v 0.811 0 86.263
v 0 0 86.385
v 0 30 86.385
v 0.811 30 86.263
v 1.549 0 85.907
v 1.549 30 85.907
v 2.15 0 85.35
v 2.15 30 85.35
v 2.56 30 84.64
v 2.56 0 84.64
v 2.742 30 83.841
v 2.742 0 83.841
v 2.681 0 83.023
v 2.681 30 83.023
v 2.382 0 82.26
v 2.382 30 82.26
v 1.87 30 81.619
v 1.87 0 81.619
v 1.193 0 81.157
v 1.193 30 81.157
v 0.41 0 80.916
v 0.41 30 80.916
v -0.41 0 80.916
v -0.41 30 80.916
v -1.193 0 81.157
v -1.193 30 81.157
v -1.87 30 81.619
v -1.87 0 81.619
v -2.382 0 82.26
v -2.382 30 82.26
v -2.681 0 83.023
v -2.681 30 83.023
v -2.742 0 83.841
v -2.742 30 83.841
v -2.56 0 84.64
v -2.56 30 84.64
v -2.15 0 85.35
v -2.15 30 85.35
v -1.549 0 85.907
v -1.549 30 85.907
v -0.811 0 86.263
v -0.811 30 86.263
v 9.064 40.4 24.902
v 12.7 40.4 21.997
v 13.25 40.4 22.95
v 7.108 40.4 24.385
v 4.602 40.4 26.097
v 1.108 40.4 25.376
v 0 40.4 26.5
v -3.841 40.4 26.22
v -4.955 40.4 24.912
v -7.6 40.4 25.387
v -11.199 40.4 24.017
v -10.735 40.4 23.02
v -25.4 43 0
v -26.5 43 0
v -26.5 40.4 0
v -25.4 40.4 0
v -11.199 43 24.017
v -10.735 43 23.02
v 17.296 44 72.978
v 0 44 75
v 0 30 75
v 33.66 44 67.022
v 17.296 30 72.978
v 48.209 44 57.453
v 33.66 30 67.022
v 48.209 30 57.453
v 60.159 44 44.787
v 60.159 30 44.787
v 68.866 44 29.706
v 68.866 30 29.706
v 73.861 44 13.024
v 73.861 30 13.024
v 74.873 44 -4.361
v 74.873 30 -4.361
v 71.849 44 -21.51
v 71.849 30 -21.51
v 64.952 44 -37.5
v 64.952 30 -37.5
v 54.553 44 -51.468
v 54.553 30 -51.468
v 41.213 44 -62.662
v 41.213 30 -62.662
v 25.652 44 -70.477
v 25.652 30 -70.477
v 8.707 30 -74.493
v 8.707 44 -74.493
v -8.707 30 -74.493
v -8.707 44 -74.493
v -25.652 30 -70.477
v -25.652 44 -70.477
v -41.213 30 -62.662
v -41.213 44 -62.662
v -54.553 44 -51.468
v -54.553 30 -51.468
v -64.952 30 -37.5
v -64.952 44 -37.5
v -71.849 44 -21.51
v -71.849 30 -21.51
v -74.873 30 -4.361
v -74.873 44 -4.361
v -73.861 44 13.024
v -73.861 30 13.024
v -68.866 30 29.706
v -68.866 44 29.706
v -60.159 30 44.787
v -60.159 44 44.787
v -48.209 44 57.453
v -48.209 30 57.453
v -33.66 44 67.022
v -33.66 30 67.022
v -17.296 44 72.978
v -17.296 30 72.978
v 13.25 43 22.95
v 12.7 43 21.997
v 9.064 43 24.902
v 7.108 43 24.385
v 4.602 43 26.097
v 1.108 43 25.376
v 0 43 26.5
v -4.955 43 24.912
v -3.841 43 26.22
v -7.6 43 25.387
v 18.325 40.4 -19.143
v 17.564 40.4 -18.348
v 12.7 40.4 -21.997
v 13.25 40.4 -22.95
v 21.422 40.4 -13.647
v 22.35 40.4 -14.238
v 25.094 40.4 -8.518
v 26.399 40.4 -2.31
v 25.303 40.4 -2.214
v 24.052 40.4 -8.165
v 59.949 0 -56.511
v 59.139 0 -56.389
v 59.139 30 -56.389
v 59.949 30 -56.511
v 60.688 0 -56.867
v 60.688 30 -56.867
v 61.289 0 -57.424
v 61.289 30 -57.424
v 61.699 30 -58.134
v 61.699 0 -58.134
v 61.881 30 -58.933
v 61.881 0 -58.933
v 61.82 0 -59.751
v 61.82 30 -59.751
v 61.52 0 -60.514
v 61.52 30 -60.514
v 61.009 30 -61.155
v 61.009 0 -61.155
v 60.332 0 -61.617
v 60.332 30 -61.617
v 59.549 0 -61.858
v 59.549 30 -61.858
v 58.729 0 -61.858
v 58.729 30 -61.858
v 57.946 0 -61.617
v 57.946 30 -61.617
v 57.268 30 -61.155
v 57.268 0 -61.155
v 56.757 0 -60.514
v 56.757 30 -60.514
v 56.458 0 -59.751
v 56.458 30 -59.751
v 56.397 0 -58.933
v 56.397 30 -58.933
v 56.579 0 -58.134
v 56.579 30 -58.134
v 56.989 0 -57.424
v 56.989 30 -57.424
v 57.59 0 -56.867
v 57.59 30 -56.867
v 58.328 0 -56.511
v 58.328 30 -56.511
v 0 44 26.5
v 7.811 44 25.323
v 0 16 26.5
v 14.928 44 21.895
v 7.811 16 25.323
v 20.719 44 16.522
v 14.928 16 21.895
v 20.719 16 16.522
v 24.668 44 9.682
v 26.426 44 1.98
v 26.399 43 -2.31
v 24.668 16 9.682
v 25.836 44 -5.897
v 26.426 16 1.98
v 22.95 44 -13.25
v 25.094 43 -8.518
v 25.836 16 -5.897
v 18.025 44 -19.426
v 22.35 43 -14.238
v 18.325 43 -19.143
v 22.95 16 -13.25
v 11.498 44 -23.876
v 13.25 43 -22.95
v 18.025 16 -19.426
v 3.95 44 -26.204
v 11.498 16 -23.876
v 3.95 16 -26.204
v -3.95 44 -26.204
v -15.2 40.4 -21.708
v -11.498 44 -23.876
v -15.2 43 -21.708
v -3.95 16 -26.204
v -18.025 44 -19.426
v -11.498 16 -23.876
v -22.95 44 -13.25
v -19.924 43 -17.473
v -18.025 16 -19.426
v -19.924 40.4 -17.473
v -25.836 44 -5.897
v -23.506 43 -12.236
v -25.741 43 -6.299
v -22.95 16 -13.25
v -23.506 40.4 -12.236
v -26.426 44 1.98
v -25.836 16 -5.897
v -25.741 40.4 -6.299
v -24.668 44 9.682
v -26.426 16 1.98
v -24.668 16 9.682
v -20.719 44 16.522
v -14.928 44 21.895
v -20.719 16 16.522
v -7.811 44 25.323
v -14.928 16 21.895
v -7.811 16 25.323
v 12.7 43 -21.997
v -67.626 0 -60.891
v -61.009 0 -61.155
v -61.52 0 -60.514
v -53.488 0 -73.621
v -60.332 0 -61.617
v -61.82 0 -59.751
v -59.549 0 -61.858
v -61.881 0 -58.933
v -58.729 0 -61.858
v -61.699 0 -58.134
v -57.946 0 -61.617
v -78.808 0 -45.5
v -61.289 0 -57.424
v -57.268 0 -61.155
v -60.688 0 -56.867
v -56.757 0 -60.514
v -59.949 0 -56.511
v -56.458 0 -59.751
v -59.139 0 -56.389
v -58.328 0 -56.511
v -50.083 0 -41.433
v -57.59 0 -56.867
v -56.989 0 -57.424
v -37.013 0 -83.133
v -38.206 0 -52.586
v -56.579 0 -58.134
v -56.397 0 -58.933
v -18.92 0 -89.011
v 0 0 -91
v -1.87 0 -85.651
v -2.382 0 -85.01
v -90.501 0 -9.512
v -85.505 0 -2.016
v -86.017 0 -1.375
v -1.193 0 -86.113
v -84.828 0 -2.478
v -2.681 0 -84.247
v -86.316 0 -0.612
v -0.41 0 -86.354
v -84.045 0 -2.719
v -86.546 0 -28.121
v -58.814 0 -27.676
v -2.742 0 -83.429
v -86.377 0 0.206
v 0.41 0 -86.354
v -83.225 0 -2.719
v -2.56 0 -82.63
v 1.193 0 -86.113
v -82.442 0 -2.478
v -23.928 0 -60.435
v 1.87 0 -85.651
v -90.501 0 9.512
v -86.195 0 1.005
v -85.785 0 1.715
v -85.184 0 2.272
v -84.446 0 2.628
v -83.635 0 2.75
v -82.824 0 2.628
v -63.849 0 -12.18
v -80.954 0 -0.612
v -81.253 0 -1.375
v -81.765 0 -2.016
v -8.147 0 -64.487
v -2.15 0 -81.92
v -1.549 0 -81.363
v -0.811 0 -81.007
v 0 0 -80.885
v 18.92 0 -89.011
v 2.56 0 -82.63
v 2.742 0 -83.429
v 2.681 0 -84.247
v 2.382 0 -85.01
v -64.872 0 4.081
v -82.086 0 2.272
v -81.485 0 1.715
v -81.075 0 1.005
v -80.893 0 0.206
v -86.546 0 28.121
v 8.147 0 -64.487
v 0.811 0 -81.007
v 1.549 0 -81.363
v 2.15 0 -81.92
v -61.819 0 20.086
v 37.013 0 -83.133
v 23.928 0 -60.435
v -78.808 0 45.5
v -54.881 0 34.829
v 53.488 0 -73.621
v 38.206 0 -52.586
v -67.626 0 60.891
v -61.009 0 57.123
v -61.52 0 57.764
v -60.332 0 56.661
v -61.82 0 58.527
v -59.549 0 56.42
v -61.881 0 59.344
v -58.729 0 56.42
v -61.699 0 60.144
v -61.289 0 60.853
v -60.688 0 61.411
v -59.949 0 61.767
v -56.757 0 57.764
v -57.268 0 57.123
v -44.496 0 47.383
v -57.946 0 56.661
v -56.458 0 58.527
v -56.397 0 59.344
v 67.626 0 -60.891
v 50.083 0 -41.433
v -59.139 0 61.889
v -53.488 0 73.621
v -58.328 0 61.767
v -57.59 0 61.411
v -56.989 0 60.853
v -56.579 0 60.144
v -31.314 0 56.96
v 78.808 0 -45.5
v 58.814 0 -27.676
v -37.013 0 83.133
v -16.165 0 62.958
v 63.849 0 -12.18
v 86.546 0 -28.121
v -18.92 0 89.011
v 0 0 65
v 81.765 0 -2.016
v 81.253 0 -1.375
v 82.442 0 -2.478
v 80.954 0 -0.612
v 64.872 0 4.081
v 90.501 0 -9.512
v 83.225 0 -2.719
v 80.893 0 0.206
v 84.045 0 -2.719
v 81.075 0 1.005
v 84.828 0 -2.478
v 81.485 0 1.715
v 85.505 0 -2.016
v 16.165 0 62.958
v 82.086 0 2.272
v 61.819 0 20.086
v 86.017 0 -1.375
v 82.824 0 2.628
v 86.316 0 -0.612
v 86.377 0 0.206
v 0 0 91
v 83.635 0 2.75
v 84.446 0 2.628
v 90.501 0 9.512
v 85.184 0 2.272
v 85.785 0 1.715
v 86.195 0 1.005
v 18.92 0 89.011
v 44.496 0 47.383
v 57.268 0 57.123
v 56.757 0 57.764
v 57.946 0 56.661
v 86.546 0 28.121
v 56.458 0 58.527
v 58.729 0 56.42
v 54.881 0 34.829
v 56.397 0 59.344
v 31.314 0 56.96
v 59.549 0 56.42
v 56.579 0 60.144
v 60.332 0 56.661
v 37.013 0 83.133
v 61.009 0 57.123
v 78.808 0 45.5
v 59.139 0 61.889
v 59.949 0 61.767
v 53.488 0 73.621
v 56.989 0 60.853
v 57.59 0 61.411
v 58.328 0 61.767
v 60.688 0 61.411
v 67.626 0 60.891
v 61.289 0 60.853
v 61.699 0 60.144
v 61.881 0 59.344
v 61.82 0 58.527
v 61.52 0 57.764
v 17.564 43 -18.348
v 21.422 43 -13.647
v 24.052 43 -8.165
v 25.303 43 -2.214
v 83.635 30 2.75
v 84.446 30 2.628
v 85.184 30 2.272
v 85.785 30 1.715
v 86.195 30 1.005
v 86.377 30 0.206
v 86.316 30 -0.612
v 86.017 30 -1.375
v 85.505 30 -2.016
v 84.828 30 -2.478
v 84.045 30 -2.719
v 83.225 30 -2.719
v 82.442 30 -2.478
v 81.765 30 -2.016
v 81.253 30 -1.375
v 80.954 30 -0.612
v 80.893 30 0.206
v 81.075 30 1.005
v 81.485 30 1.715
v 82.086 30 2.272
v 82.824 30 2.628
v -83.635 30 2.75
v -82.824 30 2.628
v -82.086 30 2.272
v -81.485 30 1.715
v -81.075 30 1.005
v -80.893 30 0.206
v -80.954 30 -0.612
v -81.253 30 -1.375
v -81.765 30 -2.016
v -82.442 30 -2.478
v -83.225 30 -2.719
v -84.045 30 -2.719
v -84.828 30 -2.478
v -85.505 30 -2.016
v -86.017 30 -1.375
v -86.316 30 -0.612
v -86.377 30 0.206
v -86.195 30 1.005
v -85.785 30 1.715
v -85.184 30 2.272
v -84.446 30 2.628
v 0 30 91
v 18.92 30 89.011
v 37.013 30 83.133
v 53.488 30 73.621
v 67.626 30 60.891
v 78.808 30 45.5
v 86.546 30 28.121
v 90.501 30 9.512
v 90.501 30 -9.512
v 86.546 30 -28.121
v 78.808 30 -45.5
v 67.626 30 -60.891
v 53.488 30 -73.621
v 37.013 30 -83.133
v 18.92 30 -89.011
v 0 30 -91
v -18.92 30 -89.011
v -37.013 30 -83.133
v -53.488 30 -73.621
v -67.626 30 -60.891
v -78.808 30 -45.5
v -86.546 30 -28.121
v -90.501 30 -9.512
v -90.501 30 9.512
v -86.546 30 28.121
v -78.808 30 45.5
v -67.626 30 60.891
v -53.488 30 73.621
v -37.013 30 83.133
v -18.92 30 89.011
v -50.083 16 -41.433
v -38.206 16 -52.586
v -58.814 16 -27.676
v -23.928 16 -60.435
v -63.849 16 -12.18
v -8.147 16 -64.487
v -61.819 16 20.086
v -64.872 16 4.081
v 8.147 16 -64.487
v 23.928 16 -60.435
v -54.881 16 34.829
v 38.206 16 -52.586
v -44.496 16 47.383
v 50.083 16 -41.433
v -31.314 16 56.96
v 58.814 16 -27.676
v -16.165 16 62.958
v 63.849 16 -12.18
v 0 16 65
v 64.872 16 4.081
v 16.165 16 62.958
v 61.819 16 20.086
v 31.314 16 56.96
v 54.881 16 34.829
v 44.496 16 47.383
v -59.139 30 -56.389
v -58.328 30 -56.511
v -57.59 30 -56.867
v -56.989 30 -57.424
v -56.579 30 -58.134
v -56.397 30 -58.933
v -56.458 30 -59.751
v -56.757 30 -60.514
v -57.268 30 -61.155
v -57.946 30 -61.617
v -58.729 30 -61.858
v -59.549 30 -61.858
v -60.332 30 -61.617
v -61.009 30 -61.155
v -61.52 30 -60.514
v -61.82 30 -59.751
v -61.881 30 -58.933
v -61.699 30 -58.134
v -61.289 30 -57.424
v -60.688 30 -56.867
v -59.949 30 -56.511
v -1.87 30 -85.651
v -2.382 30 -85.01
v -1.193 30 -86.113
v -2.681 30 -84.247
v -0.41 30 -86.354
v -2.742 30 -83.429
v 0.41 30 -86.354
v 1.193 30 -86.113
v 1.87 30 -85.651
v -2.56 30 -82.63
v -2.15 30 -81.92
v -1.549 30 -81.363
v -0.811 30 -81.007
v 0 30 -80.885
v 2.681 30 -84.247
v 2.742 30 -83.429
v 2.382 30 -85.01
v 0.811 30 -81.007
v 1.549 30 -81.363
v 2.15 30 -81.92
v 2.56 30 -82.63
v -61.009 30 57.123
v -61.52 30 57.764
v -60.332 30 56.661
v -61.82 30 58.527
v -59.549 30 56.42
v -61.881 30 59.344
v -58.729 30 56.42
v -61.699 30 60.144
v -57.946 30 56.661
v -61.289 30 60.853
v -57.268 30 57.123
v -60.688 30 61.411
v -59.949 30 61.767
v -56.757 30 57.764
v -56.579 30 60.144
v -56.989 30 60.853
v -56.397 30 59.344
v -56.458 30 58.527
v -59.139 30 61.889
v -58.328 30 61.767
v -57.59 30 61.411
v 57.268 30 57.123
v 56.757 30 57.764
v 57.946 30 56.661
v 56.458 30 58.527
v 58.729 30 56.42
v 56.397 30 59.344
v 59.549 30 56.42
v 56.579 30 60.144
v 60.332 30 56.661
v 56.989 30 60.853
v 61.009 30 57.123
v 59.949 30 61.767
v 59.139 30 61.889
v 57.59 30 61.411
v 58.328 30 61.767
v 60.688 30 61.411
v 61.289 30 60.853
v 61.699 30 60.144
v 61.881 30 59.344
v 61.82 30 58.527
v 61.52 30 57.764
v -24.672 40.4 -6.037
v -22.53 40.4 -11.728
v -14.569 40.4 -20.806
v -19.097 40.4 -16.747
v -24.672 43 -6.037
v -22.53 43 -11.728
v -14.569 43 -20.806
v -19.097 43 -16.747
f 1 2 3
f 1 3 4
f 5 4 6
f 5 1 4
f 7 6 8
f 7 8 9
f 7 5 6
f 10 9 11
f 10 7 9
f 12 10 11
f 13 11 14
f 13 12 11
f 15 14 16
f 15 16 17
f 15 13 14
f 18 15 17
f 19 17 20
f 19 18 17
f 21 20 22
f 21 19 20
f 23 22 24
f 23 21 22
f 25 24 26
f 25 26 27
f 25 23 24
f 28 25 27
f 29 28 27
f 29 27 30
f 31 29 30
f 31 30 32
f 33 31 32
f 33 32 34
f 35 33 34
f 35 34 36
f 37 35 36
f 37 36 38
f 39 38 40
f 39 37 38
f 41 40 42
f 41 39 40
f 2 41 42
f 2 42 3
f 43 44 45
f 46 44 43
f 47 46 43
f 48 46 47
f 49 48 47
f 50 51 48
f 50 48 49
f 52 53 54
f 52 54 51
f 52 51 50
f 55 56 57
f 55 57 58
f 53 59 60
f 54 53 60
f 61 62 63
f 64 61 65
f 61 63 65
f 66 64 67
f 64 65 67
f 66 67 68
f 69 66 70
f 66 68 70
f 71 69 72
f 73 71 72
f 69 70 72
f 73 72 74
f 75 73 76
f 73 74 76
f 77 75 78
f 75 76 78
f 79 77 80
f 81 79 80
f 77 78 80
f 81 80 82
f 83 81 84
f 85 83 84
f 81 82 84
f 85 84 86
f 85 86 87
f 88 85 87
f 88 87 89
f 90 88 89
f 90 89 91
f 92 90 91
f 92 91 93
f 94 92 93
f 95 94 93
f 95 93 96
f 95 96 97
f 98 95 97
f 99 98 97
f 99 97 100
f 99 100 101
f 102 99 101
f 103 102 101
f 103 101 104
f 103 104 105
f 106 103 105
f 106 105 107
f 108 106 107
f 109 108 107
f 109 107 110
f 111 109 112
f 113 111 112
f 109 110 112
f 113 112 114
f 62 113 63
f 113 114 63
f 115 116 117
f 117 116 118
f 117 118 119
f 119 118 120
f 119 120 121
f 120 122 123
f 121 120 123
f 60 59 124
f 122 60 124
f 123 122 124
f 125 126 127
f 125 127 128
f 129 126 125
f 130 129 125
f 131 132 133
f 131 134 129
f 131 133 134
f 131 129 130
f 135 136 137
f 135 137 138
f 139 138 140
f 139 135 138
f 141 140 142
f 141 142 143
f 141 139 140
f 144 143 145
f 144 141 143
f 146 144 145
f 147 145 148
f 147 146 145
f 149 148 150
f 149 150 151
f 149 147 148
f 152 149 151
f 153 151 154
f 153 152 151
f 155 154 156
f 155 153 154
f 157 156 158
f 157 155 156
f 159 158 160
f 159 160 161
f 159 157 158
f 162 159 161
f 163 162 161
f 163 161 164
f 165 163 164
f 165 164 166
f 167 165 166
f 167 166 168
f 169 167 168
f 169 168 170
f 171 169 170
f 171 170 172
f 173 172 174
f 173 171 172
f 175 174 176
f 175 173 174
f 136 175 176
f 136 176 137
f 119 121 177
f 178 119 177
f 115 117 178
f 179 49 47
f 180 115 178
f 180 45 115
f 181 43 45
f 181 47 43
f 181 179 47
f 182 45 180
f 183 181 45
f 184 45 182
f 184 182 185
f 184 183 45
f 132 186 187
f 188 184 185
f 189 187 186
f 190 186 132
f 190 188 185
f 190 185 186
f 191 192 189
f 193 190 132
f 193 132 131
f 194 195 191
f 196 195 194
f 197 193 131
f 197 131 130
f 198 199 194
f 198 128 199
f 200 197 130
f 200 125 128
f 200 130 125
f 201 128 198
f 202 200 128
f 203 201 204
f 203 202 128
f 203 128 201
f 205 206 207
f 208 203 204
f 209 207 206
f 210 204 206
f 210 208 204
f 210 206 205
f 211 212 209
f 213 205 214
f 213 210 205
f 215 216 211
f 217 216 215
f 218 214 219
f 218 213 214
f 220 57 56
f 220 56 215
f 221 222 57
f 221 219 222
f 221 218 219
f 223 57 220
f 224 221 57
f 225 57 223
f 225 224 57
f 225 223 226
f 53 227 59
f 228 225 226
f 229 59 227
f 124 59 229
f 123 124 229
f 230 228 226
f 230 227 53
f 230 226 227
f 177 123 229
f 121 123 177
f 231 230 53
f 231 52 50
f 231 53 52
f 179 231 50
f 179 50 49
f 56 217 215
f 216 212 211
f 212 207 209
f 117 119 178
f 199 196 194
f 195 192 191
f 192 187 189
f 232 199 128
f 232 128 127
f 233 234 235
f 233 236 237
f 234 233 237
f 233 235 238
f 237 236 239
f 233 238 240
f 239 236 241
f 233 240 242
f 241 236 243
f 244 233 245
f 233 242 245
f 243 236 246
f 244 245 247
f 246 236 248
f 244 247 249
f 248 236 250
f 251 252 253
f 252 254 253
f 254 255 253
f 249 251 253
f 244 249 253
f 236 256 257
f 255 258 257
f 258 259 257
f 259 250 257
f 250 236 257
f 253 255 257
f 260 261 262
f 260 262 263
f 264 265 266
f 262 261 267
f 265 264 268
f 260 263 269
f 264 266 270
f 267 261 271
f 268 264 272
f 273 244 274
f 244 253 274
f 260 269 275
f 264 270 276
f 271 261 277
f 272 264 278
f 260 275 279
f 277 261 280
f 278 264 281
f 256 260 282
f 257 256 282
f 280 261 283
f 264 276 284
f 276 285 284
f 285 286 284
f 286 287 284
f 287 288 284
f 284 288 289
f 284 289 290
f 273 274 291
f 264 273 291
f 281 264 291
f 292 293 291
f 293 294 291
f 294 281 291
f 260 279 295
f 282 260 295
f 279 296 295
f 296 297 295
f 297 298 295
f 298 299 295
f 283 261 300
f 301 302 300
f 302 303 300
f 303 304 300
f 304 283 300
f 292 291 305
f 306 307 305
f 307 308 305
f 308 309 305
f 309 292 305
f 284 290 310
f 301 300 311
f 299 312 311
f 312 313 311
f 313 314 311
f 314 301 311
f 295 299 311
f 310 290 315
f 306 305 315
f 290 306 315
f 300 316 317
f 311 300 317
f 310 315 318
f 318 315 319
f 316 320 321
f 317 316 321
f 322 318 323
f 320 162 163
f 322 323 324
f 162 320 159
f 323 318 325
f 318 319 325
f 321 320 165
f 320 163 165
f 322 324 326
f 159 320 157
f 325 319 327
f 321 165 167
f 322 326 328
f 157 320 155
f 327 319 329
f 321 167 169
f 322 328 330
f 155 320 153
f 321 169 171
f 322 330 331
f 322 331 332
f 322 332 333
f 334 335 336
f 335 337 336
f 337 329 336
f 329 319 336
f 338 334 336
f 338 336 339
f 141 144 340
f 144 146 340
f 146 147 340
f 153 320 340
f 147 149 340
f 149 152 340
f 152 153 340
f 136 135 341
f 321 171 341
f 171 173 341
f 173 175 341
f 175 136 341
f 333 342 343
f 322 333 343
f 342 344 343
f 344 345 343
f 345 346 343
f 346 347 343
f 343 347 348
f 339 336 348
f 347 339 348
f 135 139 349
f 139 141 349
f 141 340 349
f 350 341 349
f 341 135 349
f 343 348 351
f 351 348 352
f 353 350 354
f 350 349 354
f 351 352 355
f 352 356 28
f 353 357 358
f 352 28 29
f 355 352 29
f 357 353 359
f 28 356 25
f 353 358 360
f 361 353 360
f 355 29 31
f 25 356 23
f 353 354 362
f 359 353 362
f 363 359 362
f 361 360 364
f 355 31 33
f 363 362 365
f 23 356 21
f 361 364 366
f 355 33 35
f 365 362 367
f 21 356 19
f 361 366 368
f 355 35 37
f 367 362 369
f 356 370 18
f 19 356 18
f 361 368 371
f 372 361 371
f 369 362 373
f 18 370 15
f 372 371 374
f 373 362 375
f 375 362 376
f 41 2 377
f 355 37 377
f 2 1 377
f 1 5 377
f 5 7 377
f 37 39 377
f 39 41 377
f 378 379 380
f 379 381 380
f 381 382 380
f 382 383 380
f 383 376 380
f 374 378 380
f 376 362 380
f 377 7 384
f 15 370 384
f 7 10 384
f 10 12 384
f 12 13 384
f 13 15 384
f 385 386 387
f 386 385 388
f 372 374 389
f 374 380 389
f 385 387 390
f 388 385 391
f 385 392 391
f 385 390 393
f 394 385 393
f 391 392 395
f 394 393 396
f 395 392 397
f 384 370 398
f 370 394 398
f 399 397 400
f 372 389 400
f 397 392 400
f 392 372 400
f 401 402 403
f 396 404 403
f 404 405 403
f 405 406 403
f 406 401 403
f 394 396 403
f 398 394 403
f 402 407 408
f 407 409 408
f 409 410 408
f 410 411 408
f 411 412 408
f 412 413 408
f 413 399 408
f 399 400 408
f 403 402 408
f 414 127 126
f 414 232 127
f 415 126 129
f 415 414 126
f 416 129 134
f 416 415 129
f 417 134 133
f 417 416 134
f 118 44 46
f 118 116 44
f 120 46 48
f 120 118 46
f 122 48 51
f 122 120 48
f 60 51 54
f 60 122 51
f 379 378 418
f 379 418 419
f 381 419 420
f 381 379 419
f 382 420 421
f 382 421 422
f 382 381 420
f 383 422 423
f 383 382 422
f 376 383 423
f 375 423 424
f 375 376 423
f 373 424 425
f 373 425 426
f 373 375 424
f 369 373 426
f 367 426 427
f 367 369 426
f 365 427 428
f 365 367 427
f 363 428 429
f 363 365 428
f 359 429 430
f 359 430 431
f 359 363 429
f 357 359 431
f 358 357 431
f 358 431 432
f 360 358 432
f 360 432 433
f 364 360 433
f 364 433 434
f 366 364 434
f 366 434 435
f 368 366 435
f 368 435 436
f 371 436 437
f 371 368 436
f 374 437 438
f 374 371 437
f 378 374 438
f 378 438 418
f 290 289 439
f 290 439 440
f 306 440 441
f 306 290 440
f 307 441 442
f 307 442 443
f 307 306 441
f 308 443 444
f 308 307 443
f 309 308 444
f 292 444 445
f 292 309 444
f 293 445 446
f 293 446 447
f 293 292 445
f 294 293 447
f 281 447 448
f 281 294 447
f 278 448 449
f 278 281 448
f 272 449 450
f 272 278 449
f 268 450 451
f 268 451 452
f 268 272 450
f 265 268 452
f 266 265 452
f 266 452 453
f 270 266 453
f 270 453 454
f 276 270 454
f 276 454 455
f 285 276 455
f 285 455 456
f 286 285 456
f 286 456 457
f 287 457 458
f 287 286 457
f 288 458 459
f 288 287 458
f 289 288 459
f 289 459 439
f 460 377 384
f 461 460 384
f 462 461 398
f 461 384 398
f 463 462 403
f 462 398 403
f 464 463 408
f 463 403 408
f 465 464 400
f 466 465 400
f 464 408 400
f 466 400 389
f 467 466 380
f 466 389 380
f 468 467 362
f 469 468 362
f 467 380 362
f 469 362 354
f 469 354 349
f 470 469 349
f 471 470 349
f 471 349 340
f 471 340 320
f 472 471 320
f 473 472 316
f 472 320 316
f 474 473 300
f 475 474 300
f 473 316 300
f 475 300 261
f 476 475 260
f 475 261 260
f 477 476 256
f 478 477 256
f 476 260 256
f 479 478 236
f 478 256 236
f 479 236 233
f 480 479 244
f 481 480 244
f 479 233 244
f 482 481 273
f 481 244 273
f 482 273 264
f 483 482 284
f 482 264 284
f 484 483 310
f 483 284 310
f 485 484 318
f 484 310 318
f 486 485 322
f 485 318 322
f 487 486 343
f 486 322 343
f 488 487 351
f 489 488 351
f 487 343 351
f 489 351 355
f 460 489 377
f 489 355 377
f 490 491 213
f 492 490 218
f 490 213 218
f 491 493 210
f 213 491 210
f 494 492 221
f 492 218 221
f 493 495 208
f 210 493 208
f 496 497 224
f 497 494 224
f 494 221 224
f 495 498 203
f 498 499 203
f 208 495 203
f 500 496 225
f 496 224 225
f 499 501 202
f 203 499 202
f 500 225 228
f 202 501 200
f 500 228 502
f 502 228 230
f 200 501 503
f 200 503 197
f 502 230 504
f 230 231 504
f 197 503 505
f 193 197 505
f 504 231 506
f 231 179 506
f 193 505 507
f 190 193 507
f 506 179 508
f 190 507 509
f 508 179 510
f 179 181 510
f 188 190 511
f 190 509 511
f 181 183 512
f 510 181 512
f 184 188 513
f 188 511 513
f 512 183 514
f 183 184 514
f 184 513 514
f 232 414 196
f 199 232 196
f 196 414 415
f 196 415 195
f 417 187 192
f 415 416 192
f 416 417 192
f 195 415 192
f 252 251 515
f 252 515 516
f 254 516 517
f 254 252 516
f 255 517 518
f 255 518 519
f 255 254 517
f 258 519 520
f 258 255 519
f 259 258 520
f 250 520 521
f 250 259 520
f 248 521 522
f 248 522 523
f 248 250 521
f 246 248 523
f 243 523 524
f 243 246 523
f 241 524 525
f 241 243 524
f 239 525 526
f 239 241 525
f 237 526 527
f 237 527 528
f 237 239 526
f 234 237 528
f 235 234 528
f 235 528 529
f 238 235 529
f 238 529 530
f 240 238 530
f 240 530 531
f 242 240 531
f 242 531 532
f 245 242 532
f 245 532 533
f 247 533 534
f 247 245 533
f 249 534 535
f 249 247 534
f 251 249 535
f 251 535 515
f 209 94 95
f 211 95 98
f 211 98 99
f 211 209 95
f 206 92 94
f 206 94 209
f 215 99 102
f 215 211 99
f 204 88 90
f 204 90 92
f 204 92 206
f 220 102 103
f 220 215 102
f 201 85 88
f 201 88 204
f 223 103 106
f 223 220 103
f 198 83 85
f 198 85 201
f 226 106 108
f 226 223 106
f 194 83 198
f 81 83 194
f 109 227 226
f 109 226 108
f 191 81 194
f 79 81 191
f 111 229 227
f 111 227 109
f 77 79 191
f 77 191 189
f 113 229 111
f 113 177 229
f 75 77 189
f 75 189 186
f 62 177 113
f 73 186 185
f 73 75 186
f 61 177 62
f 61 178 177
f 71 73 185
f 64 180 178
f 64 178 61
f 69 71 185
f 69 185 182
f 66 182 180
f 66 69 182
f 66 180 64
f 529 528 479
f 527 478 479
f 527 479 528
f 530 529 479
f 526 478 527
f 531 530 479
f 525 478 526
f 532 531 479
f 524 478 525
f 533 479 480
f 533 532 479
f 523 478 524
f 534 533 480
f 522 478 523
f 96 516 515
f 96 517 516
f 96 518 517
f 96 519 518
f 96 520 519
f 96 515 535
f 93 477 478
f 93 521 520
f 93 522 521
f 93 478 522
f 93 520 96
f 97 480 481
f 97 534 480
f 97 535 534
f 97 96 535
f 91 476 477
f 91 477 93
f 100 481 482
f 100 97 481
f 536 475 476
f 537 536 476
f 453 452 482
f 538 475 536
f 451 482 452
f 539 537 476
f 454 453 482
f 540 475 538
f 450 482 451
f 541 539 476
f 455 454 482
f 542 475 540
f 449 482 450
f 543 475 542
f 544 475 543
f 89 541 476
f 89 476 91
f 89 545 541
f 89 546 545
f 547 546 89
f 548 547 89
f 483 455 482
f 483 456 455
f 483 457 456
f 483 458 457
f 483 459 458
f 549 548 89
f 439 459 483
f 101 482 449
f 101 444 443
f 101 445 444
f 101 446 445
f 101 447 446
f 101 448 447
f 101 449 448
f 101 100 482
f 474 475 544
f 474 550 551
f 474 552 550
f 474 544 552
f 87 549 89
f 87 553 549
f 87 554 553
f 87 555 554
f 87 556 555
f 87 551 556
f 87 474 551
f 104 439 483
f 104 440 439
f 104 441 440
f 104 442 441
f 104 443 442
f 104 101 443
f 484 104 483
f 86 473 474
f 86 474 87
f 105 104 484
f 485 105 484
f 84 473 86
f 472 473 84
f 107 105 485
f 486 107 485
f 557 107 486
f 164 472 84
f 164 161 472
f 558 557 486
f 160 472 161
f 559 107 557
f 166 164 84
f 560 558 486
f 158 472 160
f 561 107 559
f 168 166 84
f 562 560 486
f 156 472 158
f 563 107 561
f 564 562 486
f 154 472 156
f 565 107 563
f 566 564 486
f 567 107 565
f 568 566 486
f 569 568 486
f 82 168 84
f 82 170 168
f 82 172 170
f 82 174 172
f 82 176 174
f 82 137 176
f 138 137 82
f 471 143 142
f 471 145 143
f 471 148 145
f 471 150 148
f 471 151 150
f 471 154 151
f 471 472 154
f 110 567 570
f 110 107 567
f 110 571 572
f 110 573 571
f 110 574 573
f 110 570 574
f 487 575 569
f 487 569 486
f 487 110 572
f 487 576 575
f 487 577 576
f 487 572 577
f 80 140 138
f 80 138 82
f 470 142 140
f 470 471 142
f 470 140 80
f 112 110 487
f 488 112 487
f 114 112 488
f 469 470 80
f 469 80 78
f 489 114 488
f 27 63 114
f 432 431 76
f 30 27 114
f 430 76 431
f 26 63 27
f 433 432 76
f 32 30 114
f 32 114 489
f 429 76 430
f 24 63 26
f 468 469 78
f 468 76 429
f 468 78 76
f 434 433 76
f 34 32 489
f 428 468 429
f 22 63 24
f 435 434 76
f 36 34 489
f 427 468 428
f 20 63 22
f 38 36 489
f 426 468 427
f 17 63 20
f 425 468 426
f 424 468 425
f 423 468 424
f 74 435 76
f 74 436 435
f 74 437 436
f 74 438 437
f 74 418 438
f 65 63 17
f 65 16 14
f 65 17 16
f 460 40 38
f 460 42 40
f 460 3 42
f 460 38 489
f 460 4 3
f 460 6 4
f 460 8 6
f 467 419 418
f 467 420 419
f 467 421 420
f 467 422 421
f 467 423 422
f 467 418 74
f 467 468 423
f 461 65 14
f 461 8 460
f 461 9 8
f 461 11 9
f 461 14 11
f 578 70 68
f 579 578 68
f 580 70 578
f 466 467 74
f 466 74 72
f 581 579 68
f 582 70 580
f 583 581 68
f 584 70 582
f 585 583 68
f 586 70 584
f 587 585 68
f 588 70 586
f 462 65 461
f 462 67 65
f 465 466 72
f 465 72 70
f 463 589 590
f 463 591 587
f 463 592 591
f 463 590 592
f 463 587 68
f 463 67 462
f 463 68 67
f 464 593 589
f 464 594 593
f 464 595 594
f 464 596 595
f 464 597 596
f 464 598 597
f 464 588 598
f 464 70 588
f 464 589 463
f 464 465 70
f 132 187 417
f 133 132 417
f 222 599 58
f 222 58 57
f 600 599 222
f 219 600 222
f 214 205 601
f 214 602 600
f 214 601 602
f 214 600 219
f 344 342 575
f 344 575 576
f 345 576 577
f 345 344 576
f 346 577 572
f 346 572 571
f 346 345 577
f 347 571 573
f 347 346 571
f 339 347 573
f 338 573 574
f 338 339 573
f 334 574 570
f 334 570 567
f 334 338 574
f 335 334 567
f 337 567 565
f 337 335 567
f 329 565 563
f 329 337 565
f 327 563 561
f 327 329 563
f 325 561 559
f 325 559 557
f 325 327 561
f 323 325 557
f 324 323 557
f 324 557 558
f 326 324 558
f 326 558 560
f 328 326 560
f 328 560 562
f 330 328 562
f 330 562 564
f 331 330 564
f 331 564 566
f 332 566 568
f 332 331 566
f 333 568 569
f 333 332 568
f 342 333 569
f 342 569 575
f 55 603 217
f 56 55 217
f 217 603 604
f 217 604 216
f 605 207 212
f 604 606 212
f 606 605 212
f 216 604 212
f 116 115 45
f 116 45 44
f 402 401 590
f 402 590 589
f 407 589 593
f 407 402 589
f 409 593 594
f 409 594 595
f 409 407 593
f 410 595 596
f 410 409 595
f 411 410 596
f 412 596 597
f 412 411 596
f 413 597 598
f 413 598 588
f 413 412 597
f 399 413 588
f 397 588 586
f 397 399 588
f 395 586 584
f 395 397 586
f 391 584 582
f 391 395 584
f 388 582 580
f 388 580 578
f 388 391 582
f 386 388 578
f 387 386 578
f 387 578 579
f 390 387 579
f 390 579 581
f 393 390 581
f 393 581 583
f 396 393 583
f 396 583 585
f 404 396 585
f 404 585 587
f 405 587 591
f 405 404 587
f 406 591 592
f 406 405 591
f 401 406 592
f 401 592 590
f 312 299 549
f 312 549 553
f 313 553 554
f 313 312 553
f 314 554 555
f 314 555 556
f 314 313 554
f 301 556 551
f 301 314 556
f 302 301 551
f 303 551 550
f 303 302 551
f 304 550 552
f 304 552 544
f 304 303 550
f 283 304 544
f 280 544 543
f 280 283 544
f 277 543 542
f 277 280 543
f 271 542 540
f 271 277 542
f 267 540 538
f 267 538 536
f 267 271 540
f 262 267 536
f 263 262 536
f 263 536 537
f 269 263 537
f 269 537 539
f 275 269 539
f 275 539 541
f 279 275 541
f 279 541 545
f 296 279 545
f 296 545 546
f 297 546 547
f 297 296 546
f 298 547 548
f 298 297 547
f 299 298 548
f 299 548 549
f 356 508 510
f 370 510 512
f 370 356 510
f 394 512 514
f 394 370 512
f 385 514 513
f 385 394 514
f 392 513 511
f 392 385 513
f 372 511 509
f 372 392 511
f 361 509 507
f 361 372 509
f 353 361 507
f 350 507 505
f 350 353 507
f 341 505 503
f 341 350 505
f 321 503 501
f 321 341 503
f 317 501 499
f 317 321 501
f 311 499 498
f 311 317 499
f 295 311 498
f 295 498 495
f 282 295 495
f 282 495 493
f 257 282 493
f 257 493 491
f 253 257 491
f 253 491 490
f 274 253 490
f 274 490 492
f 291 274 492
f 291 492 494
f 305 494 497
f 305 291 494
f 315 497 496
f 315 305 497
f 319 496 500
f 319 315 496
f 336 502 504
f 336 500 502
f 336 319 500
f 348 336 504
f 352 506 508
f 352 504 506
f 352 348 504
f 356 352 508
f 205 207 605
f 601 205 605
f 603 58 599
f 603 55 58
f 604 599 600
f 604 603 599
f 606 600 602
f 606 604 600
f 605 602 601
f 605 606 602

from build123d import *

# Parameters (mm, degrees)
SKETCH1_R                = 91
SKETCH1_R_2              = 65
SKETCH1_R_3              = 2.75
BOSS_EXTRUDE1_DEPTH      = 30
BOSS_EXTRUDE2_DEPTH      = 14
BOSS_EXTRUDE2_DEPTH_BACK = 14
SKETCH2_R                = 75
SKETCH2_R_2              = 26.5
SKETCH5_W                = 1.1
SKETCH5_H                = 2.6
REVOLVE1_ANGLE           = 55
CIRPATTERN1_COUNT        = 3


with BuildPart() as part:
    # Sketch1 → Boss-Extrude1 (new body)
    with BuildSketch(Plane(origin=(0, 0, 0), x_dir=(1, 0, 0), z_dir=(0, 1, 0))):
        with Locations(Location((0, 0, 0), (0, 0, 270))):
            Circle(SKETCH1_R)
        with Locations(Location((0, 0, 0), (0, 0, 270))):
            Circle(SKETCH1_R_2, mode=Mode.SUBTRACT)
        with Locations(Location((0, 83.635, 0), (0, 0, 270))):
            Circle(SKETCH1_R_3, mode=Mode.SUBTRACT)
        with Locations(Location((59.138875645, 59.138875645, 0), (0, 0, 270))):
            Circle(SKETCH1_R_3, mode=Mode.SUBTRACT)
        with Locations(Location((83.635, 0, 0), (0, 0, 270))):
            Circle(SKETCH1_R_3, mode=Mode.SUBTRACT)
        with Locations(Location((59.138875645, -59.138875645, 0), (0, 0, 270))):
            Circle(SKETCH1_R_3, mode=Mode.SUBTRACT)
        with Locations(Location((0, -83.635, 0), (0, 0, 270))):
            Circle(SKETCH1_R_3, mode=Mode.SUBTRACT)
        with Locations(Location((-59.138875645, -59.138875645, 0), (0, 0, 270))):
            Circle(SKETCH1_R_3, mode=Mode.SUBTRACT)
        with Locations(Location((-83.635, 0, 0), (0, 0, 270))):
            Circle(SKETCH1_R_3, mode=Mode.SUBTRACT)
        with Locations(Location((-59.138875645, 59.138875645, 0), (0, 0, 270))):
            Circle(SKETCH1_R_3, mode=Mode.SUBTRACT)
    extrude(amount=BOSS_EXTRUDE1_DEPTH)

    # Sketch2 → Boss-Extrude2 (add, two sides: drawn at the far end of the back side and taken through both)
    with BuildSketch(Plane(origin=(0, 30, 0), x_dir=(1, 0, 0), z_dir=(0, 1, 0)).offset(-BOSS_EXTRUDE2_DEPTH_BACK)):
        with Locations(Location((0, 0, 0), (0, 0, 270))):
            Circle(SKETCH2_R)
        with Locations(Location((0, 0, 0), (0, 0, 270))):
            Circle(SKETCH2_R_2, mode=Mode.SUBTRACT)
    extrude(amount=BOSS_EXTRUDE2_DEPTH + BOSS_EXTRUDE2_DEPTH_BACK)

    # Sketch5 → Revolve1 (revolve)
    with BuildSketch(Plane.XY):
        with Locations((-25.95, 41.7)):
            Rectangle(SKETCH5_W, SKETCH5_H)
    revolve1 = revolve(axis=Axis((0, 48.211759647, 0), (0, -1, 0)), revolution_arc=REVOLVE1_ANGLE)

    # CirPattern1: Revolve1 ×3 about axis
    cirpattern1_axis = Axis((0, 0, 0), (0, 1, 0))
    for i in range(1, CIRPATTERN1_COUNT):
        add(revolve1.rotate(cirpattern1_axis, i * 360 / CIRPATTERN1_COUNT))


solid = part.part
